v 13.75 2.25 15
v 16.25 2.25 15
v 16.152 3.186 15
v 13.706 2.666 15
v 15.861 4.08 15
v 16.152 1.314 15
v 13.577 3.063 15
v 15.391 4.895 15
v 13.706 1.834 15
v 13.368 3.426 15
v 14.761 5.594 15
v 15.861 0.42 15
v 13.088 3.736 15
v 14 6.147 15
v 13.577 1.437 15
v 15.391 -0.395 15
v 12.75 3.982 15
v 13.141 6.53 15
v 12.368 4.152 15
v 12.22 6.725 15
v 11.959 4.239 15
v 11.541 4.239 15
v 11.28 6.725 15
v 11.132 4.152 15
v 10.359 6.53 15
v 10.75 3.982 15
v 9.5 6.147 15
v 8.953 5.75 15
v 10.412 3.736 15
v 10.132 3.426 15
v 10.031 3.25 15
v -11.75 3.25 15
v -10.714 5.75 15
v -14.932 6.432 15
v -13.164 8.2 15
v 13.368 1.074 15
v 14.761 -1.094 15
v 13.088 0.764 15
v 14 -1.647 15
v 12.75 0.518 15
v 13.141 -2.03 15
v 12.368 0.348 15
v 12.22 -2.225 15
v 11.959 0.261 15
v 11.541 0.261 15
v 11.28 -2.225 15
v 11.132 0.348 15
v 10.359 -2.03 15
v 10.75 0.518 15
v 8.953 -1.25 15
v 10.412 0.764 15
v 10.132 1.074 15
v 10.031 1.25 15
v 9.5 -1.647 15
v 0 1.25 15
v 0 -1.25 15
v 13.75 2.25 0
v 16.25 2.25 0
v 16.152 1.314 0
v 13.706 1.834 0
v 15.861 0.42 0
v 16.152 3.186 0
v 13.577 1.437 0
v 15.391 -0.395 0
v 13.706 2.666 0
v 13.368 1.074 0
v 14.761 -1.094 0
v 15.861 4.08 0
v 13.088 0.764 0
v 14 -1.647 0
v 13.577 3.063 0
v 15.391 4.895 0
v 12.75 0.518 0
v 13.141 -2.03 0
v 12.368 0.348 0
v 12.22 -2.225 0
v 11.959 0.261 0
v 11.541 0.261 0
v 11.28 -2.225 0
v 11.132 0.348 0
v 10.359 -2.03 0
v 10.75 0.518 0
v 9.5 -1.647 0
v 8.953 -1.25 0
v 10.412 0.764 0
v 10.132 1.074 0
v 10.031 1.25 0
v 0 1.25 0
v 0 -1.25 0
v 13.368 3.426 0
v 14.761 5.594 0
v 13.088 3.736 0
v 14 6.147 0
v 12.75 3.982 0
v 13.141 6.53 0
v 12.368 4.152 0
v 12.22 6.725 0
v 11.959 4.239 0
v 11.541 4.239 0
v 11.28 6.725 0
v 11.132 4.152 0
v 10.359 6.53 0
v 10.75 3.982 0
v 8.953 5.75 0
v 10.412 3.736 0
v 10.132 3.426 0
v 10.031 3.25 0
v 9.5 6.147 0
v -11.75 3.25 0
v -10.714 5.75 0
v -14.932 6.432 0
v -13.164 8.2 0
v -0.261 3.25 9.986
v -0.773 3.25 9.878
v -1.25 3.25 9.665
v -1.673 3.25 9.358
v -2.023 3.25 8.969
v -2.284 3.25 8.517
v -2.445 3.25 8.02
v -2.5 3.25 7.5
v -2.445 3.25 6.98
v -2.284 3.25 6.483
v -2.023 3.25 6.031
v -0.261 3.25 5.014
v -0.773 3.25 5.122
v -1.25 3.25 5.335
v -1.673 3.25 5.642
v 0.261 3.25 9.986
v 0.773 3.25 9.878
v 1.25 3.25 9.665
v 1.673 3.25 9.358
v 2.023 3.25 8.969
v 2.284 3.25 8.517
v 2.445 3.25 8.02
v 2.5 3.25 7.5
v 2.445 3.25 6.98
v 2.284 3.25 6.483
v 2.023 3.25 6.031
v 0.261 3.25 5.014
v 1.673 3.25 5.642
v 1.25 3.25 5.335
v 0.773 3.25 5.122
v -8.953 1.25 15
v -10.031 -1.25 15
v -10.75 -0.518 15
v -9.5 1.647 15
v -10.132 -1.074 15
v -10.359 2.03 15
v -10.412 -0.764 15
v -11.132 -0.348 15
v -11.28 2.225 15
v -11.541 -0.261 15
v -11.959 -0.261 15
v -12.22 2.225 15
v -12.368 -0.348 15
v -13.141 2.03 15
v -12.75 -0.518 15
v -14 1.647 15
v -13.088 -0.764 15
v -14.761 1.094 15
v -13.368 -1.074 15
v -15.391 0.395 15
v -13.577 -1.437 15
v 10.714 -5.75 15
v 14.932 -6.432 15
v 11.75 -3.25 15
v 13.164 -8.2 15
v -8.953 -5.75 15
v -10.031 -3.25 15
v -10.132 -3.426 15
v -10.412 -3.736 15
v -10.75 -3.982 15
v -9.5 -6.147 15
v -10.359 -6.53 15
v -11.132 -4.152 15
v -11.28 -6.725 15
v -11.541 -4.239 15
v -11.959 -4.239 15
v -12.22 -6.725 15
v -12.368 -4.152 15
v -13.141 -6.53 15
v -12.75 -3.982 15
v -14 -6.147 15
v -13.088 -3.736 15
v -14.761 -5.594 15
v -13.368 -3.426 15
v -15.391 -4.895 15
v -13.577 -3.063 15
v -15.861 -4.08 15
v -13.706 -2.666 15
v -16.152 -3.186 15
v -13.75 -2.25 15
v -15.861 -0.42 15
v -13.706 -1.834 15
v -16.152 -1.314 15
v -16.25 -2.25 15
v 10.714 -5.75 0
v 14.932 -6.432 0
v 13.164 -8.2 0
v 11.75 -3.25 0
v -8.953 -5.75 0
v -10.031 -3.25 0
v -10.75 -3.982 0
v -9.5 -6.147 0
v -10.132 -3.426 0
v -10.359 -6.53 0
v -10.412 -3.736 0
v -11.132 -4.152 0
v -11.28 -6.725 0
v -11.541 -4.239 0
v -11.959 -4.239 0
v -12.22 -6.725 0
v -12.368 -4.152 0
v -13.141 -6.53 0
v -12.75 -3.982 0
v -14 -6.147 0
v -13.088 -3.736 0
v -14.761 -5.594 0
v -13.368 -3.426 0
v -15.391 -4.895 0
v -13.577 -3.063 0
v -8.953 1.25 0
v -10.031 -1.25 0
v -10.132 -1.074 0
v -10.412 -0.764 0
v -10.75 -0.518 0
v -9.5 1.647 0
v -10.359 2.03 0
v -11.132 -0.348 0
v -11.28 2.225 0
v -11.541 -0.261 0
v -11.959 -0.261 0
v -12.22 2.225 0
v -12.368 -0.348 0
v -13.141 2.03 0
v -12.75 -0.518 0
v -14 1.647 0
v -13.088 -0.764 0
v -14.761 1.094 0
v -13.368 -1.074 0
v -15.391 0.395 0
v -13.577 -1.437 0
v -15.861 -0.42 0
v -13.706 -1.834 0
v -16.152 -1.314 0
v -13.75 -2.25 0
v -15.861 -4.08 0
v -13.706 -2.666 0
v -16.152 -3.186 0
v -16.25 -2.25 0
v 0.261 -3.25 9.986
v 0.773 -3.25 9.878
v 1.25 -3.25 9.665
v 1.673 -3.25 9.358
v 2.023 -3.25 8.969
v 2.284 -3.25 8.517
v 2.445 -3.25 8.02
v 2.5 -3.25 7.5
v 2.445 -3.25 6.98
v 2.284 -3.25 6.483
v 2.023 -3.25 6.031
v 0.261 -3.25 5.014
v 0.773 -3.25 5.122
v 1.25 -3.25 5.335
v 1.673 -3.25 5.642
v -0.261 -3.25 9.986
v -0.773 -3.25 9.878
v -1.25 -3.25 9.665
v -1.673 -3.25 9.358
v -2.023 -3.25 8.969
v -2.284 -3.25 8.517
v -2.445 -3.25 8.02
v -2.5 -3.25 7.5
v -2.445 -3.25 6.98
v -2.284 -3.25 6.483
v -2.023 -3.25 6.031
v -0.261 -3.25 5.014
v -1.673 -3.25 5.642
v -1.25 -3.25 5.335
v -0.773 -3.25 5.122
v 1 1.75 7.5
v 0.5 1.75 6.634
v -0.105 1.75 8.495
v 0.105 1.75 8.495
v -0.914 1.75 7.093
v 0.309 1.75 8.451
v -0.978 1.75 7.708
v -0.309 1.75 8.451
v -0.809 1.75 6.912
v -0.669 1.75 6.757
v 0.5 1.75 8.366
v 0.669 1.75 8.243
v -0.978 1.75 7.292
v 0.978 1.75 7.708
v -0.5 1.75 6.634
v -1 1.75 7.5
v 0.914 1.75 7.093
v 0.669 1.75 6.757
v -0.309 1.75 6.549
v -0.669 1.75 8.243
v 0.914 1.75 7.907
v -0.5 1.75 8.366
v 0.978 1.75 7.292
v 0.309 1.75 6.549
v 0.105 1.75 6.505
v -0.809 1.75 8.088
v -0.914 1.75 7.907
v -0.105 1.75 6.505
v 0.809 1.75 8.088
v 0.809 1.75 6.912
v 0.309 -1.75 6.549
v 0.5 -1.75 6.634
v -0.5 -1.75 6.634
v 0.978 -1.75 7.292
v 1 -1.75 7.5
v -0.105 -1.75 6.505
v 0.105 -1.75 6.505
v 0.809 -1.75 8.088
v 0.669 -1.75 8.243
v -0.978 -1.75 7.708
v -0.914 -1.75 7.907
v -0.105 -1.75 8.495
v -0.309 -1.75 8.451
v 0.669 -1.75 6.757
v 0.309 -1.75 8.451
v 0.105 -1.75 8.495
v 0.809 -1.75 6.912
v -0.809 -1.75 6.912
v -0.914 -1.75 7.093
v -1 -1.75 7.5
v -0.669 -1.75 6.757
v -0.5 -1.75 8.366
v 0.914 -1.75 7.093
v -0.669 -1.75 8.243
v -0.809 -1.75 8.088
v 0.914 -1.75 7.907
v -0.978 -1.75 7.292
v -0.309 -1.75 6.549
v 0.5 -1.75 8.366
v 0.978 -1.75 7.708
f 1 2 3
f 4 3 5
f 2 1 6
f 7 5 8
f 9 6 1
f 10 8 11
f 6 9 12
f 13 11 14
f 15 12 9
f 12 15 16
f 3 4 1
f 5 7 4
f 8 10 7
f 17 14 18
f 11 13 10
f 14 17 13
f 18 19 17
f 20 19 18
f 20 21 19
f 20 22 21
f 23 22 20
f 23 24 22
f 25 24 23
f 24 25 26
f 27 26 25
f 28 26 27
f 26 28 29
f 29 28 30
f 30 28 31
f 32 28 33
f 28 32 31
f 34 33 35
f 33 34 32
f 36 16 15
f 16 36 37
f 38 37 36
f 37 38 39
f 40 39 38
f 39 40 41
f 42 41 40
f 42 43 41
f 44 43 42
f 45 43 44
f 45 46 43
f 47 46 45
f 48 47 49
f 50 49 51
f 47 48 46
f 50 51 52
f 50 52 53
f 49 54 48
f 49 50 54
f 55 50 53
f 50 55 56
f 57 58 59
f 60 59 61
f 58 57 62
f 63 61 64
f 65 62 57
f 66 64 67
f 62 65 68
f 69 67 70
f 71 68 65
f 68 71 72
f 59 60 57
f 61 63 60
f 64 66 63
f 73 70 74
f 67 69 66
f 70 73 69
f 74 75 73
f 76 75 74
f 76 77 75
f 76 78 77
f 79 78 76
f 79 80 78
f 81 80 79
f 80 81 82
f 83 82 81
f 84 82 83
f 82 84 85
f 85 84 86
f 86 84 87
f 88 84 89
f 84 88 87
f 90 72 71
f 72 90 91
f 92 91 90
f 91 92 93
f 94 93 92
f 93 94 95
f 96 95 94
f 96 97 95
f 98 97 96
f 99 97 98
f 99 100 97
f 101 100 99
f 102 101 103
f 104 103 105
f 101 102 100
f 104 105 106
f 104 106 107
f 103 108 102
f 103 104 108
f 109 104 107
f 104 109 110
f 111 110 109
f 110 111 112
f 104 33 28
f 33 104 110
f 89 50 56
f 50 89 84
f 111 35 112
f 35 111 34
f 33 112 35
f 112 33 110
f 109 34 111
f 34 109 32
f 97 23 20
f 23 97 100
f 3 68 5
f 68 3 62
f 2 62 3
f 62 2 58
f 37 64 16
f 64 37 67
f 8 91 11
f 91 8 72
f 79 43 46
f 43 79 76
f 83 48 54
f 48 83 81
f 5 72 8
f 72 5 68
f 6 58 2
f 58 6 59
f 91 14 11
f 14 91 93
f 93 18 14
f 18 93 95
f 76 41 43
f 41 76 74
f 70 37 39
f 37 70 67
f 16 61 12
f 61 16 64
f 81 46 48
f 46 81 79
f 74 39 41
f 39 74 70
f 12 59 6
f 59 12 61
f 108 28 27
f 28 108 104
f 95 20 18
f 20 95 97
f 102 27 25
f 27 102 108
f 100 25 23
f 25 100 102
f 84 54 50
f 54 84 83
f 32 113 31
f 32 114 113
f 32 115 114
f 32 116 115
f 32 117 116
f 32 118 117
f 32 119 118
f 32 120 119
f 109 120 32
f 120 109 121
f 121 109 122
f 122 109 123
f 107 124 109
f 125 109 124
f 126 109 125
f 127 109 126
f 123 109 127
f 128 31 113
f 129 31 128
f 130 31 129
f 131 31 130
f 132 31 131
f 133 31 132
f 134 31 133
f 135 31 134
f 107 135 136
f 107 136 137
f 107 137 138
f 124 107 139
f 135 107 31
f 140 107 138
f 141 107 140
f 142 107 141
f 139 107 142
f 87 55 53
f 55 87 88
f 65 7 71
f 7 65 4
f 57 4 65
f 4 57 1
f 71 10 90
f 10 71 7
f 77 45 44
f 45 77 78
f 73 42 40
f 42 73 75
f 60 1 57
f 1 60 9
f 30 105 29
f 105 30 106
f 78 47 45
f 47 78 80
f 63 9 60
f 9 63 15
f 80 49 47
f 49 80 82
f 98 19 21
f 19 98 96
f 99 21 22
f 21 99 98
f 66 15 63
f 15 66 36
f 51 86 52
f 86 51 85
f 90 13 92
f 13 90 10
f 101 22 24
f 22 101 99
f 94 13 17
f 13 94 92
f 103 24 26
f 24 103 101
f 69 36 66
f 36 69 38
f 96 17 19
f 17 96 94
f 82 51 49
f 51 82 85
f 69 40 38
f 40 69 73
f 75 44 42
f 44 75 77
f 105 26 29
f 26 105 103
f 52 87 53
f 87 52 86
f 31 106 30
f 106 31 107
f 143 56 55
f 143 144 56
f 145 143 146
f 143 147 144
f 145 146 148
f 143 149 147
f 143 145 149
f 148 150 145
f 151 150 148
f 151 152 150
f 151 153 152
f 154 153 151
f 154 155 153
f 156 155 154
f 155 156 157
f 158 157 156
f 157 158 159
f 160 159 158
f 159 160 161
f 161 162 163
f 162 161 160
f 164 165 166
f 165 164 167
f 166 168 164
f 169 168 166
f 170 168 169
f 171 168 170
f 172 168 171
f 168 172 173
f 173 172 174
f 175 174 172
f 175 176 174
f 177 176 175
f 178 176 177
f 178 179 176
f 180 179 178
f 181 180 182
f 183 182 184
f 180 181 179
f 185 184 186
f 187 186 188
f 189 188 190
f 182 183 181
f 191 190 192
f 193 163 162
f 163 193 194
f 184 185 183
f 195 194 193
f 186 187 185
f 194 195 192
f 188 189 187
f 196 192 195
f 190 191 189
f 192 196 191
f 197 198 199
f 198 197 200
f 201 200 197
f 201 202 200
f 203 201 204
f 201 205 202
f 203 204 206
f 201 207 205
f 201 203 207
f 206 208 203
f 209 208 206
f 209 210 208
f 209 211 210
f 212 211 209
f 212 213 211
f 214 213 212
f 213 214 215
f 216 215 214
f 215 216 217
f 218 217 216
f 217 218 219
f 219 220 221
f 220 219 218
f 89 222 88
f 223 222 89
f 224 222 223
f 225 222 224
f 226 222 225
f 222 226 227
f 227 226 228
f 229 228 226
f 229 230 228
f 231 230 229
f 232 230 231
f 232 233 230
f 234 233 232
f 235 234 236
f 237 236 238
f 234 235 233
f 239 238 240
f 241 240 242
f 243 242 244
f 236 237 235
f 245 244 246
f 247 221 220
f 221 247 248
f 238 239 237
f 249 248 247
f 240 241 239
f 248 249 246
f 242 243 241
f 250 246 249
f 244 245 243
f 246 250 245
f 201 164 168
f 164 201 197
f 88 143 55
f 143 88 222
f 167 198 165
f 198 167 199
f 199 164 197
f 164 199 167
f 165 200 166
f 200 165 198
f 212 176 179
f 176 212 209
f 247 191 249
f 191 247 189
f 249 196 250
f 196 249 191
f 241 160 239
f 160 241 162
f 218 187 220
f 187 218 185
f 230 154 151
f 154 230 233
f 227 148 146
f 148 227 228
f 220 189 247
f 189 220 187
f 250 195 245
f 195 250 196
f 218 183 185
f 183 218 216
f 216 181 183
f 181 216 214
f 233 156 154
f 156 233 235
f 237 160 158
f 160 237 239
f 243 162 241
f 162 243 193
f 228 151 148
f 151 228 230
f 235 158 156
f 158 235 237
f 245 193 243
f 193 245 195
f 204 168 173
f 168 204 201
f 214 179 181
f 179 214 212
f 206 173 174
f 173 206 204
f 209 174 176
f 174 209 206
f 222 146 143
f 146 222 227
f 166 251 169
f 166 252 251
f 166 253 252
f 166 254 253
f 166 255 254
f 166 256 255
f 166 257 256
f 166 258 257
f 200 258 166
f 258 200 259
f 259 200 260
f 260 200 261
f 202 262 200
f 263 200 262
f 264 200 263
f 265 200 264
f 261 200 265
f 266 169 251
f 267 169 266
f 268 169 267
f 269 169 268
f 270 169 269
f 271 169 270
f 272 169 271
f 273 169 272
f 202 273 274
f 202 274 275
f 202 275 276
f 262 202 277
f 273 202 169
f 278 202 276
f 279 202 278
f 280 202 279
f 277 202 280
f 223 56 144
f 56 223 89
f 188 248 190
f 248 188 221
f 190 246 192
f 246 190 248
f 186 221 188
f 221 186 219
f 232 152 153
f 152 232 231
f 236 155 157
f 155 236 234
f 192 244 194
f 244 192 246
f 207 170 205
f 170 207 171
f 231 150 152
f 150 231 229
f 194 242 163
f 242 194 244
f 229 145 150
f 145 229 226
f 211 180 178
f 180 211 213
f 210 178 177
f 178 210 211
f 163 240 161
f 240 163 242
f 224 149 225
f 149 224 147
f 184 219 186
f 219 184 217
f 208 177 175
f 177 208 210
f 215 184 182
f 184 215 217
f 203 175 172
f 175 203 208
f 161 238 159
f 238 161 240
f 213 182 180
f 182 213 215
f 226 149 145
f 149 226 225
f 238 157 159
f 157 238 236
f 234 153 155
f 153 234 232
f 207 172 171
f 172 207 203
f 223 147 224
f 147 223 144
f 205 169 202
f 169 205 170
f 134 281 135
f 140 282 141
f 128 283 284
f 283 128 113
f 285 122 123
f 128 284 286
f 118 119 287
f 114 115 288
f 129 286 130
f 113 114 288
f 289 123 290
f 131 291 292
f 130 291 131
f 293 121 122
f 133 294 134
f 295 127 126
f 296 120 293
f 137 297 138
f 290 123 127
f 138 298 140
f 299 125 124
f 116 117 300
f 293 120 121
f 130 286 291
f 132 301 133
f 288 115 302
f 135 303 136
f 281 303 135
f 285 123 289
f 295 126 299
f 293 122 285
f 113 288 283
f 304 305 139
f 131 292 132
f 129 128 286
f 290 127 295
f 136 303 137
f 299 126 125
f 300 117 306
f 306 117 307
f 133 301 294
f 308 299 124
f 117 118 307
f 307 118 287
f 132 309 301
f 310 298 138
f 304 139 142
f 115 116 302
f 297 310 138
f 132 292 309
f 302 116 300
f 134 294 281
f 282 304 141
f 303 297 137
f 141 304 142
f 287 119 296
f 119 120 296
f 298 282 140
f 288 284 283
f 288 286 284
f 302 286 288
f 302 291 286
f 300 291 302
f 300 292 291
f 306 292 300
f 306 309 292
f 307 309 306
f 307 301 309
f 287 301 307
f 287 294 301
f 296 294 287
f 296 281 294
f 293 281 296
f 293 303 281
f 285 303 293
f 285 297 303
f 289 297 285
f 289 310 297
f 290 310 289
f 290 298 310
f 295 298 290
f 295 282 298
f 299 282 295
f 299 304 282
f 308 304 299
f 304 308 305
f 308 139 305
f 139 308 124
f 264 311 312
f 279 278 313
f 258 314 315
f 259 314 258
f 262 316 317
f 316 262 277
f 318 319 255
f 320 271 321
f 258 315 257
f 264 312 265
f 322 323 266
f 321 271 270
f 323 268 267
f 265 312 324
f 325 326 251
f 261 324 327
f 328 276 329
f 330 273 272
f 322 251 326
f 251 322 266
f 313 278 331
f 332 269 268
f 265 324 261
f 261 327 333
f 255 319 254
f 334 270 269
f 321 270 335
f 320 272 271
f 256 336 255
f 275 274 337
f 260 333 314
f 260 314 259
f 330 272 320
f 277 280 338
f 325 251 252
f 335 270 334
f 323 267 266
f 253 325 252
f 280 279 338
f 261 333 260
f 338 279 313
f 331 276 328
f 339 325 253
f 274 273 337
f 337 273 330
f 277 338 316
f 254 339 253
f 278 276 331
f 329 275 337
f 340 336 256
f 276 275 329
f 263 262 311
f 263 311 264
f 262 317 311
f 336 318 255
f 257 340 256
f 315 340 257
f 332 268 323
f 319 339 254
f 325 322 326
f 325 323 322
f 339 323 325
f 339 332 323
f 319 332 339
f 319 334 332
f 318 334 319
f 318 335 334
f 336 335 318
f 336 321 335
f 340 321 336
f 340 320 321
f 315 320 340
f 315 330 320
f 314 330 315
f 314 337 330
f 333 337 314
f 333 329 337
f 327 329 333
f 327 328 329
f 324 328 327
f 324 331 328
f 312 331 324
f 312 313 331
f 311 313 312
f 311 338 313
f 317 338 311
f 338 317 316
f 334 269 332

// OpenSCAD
// Customizable Strap S-Clip by Jim DeVona

// (mm) Determines width of center section of clip.
strap_width = 19;

// (mm) Determines size of openings in clip.
strap_thickness = 2;

// (mm) Determines thickness of clip walls.
wall_thickness = 2.5;

// (mm)
height = 15;

// If enabled, generate nubs on inner surface of clip to grip strap holes. Edit script to change tab dimensions.
tabs = "Enabled"; // [Enabled,Disabled]

/* [Hidden] */

strap_x = strap_width;
strap_y = strap_thickness;

box_y = 2 * wall_thickness + strap_y;

spring_ro = wall_thickness + strap_y;
spring_ri =  strap_y;
spring_y = wall_thickness + strap_y/2;

module Clip() {
	translate([-(strap_x + spring_ro)/2, -wall_thickness/2, 0])
	difference() {
		
		// positive space
		union() {
			
			// center section (extended into spring ring)
			cube([strap_x + spring_ro, box_y, height]);
			
			// opening handles
			translate([0, wall_thickness + strap_y, 0])
			rotate([0, 0, -45])
			translate([-spring_ro, 0, 0])
			cube([spring_ro, wall_thickness, height]);
			
			// spring ring
			translate([strap_x + spring_ro, spring_y, 0])
			cylinder(r = spring_ro, h = height, $fn = 30);
		}
		
		// negative space
		union() {
			
			// slot in center section for strap
			translate([0, wall_thickness, 0])
			cube([strap_x + spring_ro, strap_y, height]);
			
			// cavity in spring ring (affords flex)
			translate([strap_x + spring_ro, spring_y, 0])
			cylinder(r = spring_ri, h = height, $fn = 30);
			
			// chop off part that will be reflected
			cube([(strap_x + spring_ro) / 2, wall_thickness, height]);
		}
	}
}

module Tab() {
	cylinder(r1 = 2.5, r2 = 1, h = 1.5, $fn = 30);
}

union() {
	
	Clip();
	
	rotate([0, 0, 180])
	Clip();
	
	if (tabs == "Enabled") {
		translate([0, wall_thickness/2 + strap_y, height/2])
		rotate([90, 0, 0])
		Tab();

		translate([0, -(wall_thickness/2 + strap_y), height/2])
		rotate([-90, 0, 0])
		Tab();
	}
}
